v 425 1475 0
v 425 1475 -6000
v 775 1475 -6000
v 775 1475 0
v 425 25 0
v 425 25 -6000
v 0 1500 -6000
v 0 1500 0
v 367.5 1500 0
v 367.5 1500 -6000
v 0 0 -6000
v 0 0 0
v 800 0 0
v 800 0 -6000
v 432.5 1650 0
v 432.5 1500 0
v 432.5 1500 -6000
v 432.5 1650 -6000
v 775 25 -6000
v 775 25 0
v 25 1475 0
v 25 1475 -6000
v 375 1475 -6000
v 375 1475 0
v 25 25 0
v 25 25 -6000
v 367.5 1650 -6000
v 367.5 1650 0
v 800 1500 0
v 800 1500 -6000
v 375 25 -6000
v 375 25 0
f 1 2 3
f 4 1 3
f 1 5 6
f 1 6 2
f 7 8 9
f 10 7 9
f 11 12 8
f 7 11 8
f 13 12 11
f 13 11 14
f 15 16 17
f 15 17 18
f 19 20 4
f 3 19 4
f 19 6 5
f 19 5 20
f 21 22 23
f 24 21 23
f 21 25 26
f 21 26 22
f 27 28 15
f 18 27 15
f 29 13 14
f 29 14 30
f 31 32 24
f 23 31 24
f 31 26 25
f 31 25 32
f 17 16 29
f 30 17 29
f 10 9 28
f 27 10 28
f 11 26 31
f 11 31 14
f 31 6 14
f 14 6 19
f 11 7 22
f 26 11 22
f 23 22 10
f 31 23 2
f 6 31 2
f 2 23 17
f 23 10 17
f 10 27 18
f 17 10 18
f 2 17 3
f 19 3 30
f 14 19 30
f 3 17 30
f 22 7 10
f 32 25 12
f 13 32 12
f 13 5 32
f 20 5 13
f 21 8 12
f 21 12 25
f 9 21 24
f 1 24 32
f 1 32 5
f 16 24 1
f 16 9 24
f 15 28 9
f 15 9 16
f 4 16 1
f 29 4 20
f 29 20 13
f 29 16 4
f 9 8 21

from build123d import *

# Parameters (mm, degrees)
ESQUISSE1_W        = 800
ESQUISSE1_H        = 1500
ESQUISSE1_W_2      = 350
ESQUISSE1_H_2      = 1450
BOSS_EXTRU_1_DEPTH = 6000
ESQUISSE2_W        = 65
ESQUISSE2_H        = 150
BOSS_EXTRU_2_DEPTH = 6000


with BuildPart() as part:
    # Esquisse1 → Boss.-Extru.1 (new body)
    with BuildSketch(Plane.XY):
        with Locations((400, 750)):
            Rectangle(ESQUISSE1_W, ESQUISSE1_H)
        with Locations((600, 750)):
            Rectangle(ESQUISSE1_W_2, ESQUISSE1_H_2, mode=Mode.SUBTRACT)
        with Locations((200, 750)):
            Rectangle(ESQUISSE1_W_2, ESQUISSE1_H_2, mode=Mode.SUBTRACT)
    extrude(amount=-BOSS_EXTRU_1_DEPTH)

    # Esquisse2 → Boss.-Extru.2 (add)
    with BuildSketch(Plane.XY):
        with Locations((400, 1575)):
            Rectangle(ESQUISSE2_W, ESQUISSE2_H)
    extrude(amount=-BOSS_EXTRU_2_DEPTH)


solid = part.part
